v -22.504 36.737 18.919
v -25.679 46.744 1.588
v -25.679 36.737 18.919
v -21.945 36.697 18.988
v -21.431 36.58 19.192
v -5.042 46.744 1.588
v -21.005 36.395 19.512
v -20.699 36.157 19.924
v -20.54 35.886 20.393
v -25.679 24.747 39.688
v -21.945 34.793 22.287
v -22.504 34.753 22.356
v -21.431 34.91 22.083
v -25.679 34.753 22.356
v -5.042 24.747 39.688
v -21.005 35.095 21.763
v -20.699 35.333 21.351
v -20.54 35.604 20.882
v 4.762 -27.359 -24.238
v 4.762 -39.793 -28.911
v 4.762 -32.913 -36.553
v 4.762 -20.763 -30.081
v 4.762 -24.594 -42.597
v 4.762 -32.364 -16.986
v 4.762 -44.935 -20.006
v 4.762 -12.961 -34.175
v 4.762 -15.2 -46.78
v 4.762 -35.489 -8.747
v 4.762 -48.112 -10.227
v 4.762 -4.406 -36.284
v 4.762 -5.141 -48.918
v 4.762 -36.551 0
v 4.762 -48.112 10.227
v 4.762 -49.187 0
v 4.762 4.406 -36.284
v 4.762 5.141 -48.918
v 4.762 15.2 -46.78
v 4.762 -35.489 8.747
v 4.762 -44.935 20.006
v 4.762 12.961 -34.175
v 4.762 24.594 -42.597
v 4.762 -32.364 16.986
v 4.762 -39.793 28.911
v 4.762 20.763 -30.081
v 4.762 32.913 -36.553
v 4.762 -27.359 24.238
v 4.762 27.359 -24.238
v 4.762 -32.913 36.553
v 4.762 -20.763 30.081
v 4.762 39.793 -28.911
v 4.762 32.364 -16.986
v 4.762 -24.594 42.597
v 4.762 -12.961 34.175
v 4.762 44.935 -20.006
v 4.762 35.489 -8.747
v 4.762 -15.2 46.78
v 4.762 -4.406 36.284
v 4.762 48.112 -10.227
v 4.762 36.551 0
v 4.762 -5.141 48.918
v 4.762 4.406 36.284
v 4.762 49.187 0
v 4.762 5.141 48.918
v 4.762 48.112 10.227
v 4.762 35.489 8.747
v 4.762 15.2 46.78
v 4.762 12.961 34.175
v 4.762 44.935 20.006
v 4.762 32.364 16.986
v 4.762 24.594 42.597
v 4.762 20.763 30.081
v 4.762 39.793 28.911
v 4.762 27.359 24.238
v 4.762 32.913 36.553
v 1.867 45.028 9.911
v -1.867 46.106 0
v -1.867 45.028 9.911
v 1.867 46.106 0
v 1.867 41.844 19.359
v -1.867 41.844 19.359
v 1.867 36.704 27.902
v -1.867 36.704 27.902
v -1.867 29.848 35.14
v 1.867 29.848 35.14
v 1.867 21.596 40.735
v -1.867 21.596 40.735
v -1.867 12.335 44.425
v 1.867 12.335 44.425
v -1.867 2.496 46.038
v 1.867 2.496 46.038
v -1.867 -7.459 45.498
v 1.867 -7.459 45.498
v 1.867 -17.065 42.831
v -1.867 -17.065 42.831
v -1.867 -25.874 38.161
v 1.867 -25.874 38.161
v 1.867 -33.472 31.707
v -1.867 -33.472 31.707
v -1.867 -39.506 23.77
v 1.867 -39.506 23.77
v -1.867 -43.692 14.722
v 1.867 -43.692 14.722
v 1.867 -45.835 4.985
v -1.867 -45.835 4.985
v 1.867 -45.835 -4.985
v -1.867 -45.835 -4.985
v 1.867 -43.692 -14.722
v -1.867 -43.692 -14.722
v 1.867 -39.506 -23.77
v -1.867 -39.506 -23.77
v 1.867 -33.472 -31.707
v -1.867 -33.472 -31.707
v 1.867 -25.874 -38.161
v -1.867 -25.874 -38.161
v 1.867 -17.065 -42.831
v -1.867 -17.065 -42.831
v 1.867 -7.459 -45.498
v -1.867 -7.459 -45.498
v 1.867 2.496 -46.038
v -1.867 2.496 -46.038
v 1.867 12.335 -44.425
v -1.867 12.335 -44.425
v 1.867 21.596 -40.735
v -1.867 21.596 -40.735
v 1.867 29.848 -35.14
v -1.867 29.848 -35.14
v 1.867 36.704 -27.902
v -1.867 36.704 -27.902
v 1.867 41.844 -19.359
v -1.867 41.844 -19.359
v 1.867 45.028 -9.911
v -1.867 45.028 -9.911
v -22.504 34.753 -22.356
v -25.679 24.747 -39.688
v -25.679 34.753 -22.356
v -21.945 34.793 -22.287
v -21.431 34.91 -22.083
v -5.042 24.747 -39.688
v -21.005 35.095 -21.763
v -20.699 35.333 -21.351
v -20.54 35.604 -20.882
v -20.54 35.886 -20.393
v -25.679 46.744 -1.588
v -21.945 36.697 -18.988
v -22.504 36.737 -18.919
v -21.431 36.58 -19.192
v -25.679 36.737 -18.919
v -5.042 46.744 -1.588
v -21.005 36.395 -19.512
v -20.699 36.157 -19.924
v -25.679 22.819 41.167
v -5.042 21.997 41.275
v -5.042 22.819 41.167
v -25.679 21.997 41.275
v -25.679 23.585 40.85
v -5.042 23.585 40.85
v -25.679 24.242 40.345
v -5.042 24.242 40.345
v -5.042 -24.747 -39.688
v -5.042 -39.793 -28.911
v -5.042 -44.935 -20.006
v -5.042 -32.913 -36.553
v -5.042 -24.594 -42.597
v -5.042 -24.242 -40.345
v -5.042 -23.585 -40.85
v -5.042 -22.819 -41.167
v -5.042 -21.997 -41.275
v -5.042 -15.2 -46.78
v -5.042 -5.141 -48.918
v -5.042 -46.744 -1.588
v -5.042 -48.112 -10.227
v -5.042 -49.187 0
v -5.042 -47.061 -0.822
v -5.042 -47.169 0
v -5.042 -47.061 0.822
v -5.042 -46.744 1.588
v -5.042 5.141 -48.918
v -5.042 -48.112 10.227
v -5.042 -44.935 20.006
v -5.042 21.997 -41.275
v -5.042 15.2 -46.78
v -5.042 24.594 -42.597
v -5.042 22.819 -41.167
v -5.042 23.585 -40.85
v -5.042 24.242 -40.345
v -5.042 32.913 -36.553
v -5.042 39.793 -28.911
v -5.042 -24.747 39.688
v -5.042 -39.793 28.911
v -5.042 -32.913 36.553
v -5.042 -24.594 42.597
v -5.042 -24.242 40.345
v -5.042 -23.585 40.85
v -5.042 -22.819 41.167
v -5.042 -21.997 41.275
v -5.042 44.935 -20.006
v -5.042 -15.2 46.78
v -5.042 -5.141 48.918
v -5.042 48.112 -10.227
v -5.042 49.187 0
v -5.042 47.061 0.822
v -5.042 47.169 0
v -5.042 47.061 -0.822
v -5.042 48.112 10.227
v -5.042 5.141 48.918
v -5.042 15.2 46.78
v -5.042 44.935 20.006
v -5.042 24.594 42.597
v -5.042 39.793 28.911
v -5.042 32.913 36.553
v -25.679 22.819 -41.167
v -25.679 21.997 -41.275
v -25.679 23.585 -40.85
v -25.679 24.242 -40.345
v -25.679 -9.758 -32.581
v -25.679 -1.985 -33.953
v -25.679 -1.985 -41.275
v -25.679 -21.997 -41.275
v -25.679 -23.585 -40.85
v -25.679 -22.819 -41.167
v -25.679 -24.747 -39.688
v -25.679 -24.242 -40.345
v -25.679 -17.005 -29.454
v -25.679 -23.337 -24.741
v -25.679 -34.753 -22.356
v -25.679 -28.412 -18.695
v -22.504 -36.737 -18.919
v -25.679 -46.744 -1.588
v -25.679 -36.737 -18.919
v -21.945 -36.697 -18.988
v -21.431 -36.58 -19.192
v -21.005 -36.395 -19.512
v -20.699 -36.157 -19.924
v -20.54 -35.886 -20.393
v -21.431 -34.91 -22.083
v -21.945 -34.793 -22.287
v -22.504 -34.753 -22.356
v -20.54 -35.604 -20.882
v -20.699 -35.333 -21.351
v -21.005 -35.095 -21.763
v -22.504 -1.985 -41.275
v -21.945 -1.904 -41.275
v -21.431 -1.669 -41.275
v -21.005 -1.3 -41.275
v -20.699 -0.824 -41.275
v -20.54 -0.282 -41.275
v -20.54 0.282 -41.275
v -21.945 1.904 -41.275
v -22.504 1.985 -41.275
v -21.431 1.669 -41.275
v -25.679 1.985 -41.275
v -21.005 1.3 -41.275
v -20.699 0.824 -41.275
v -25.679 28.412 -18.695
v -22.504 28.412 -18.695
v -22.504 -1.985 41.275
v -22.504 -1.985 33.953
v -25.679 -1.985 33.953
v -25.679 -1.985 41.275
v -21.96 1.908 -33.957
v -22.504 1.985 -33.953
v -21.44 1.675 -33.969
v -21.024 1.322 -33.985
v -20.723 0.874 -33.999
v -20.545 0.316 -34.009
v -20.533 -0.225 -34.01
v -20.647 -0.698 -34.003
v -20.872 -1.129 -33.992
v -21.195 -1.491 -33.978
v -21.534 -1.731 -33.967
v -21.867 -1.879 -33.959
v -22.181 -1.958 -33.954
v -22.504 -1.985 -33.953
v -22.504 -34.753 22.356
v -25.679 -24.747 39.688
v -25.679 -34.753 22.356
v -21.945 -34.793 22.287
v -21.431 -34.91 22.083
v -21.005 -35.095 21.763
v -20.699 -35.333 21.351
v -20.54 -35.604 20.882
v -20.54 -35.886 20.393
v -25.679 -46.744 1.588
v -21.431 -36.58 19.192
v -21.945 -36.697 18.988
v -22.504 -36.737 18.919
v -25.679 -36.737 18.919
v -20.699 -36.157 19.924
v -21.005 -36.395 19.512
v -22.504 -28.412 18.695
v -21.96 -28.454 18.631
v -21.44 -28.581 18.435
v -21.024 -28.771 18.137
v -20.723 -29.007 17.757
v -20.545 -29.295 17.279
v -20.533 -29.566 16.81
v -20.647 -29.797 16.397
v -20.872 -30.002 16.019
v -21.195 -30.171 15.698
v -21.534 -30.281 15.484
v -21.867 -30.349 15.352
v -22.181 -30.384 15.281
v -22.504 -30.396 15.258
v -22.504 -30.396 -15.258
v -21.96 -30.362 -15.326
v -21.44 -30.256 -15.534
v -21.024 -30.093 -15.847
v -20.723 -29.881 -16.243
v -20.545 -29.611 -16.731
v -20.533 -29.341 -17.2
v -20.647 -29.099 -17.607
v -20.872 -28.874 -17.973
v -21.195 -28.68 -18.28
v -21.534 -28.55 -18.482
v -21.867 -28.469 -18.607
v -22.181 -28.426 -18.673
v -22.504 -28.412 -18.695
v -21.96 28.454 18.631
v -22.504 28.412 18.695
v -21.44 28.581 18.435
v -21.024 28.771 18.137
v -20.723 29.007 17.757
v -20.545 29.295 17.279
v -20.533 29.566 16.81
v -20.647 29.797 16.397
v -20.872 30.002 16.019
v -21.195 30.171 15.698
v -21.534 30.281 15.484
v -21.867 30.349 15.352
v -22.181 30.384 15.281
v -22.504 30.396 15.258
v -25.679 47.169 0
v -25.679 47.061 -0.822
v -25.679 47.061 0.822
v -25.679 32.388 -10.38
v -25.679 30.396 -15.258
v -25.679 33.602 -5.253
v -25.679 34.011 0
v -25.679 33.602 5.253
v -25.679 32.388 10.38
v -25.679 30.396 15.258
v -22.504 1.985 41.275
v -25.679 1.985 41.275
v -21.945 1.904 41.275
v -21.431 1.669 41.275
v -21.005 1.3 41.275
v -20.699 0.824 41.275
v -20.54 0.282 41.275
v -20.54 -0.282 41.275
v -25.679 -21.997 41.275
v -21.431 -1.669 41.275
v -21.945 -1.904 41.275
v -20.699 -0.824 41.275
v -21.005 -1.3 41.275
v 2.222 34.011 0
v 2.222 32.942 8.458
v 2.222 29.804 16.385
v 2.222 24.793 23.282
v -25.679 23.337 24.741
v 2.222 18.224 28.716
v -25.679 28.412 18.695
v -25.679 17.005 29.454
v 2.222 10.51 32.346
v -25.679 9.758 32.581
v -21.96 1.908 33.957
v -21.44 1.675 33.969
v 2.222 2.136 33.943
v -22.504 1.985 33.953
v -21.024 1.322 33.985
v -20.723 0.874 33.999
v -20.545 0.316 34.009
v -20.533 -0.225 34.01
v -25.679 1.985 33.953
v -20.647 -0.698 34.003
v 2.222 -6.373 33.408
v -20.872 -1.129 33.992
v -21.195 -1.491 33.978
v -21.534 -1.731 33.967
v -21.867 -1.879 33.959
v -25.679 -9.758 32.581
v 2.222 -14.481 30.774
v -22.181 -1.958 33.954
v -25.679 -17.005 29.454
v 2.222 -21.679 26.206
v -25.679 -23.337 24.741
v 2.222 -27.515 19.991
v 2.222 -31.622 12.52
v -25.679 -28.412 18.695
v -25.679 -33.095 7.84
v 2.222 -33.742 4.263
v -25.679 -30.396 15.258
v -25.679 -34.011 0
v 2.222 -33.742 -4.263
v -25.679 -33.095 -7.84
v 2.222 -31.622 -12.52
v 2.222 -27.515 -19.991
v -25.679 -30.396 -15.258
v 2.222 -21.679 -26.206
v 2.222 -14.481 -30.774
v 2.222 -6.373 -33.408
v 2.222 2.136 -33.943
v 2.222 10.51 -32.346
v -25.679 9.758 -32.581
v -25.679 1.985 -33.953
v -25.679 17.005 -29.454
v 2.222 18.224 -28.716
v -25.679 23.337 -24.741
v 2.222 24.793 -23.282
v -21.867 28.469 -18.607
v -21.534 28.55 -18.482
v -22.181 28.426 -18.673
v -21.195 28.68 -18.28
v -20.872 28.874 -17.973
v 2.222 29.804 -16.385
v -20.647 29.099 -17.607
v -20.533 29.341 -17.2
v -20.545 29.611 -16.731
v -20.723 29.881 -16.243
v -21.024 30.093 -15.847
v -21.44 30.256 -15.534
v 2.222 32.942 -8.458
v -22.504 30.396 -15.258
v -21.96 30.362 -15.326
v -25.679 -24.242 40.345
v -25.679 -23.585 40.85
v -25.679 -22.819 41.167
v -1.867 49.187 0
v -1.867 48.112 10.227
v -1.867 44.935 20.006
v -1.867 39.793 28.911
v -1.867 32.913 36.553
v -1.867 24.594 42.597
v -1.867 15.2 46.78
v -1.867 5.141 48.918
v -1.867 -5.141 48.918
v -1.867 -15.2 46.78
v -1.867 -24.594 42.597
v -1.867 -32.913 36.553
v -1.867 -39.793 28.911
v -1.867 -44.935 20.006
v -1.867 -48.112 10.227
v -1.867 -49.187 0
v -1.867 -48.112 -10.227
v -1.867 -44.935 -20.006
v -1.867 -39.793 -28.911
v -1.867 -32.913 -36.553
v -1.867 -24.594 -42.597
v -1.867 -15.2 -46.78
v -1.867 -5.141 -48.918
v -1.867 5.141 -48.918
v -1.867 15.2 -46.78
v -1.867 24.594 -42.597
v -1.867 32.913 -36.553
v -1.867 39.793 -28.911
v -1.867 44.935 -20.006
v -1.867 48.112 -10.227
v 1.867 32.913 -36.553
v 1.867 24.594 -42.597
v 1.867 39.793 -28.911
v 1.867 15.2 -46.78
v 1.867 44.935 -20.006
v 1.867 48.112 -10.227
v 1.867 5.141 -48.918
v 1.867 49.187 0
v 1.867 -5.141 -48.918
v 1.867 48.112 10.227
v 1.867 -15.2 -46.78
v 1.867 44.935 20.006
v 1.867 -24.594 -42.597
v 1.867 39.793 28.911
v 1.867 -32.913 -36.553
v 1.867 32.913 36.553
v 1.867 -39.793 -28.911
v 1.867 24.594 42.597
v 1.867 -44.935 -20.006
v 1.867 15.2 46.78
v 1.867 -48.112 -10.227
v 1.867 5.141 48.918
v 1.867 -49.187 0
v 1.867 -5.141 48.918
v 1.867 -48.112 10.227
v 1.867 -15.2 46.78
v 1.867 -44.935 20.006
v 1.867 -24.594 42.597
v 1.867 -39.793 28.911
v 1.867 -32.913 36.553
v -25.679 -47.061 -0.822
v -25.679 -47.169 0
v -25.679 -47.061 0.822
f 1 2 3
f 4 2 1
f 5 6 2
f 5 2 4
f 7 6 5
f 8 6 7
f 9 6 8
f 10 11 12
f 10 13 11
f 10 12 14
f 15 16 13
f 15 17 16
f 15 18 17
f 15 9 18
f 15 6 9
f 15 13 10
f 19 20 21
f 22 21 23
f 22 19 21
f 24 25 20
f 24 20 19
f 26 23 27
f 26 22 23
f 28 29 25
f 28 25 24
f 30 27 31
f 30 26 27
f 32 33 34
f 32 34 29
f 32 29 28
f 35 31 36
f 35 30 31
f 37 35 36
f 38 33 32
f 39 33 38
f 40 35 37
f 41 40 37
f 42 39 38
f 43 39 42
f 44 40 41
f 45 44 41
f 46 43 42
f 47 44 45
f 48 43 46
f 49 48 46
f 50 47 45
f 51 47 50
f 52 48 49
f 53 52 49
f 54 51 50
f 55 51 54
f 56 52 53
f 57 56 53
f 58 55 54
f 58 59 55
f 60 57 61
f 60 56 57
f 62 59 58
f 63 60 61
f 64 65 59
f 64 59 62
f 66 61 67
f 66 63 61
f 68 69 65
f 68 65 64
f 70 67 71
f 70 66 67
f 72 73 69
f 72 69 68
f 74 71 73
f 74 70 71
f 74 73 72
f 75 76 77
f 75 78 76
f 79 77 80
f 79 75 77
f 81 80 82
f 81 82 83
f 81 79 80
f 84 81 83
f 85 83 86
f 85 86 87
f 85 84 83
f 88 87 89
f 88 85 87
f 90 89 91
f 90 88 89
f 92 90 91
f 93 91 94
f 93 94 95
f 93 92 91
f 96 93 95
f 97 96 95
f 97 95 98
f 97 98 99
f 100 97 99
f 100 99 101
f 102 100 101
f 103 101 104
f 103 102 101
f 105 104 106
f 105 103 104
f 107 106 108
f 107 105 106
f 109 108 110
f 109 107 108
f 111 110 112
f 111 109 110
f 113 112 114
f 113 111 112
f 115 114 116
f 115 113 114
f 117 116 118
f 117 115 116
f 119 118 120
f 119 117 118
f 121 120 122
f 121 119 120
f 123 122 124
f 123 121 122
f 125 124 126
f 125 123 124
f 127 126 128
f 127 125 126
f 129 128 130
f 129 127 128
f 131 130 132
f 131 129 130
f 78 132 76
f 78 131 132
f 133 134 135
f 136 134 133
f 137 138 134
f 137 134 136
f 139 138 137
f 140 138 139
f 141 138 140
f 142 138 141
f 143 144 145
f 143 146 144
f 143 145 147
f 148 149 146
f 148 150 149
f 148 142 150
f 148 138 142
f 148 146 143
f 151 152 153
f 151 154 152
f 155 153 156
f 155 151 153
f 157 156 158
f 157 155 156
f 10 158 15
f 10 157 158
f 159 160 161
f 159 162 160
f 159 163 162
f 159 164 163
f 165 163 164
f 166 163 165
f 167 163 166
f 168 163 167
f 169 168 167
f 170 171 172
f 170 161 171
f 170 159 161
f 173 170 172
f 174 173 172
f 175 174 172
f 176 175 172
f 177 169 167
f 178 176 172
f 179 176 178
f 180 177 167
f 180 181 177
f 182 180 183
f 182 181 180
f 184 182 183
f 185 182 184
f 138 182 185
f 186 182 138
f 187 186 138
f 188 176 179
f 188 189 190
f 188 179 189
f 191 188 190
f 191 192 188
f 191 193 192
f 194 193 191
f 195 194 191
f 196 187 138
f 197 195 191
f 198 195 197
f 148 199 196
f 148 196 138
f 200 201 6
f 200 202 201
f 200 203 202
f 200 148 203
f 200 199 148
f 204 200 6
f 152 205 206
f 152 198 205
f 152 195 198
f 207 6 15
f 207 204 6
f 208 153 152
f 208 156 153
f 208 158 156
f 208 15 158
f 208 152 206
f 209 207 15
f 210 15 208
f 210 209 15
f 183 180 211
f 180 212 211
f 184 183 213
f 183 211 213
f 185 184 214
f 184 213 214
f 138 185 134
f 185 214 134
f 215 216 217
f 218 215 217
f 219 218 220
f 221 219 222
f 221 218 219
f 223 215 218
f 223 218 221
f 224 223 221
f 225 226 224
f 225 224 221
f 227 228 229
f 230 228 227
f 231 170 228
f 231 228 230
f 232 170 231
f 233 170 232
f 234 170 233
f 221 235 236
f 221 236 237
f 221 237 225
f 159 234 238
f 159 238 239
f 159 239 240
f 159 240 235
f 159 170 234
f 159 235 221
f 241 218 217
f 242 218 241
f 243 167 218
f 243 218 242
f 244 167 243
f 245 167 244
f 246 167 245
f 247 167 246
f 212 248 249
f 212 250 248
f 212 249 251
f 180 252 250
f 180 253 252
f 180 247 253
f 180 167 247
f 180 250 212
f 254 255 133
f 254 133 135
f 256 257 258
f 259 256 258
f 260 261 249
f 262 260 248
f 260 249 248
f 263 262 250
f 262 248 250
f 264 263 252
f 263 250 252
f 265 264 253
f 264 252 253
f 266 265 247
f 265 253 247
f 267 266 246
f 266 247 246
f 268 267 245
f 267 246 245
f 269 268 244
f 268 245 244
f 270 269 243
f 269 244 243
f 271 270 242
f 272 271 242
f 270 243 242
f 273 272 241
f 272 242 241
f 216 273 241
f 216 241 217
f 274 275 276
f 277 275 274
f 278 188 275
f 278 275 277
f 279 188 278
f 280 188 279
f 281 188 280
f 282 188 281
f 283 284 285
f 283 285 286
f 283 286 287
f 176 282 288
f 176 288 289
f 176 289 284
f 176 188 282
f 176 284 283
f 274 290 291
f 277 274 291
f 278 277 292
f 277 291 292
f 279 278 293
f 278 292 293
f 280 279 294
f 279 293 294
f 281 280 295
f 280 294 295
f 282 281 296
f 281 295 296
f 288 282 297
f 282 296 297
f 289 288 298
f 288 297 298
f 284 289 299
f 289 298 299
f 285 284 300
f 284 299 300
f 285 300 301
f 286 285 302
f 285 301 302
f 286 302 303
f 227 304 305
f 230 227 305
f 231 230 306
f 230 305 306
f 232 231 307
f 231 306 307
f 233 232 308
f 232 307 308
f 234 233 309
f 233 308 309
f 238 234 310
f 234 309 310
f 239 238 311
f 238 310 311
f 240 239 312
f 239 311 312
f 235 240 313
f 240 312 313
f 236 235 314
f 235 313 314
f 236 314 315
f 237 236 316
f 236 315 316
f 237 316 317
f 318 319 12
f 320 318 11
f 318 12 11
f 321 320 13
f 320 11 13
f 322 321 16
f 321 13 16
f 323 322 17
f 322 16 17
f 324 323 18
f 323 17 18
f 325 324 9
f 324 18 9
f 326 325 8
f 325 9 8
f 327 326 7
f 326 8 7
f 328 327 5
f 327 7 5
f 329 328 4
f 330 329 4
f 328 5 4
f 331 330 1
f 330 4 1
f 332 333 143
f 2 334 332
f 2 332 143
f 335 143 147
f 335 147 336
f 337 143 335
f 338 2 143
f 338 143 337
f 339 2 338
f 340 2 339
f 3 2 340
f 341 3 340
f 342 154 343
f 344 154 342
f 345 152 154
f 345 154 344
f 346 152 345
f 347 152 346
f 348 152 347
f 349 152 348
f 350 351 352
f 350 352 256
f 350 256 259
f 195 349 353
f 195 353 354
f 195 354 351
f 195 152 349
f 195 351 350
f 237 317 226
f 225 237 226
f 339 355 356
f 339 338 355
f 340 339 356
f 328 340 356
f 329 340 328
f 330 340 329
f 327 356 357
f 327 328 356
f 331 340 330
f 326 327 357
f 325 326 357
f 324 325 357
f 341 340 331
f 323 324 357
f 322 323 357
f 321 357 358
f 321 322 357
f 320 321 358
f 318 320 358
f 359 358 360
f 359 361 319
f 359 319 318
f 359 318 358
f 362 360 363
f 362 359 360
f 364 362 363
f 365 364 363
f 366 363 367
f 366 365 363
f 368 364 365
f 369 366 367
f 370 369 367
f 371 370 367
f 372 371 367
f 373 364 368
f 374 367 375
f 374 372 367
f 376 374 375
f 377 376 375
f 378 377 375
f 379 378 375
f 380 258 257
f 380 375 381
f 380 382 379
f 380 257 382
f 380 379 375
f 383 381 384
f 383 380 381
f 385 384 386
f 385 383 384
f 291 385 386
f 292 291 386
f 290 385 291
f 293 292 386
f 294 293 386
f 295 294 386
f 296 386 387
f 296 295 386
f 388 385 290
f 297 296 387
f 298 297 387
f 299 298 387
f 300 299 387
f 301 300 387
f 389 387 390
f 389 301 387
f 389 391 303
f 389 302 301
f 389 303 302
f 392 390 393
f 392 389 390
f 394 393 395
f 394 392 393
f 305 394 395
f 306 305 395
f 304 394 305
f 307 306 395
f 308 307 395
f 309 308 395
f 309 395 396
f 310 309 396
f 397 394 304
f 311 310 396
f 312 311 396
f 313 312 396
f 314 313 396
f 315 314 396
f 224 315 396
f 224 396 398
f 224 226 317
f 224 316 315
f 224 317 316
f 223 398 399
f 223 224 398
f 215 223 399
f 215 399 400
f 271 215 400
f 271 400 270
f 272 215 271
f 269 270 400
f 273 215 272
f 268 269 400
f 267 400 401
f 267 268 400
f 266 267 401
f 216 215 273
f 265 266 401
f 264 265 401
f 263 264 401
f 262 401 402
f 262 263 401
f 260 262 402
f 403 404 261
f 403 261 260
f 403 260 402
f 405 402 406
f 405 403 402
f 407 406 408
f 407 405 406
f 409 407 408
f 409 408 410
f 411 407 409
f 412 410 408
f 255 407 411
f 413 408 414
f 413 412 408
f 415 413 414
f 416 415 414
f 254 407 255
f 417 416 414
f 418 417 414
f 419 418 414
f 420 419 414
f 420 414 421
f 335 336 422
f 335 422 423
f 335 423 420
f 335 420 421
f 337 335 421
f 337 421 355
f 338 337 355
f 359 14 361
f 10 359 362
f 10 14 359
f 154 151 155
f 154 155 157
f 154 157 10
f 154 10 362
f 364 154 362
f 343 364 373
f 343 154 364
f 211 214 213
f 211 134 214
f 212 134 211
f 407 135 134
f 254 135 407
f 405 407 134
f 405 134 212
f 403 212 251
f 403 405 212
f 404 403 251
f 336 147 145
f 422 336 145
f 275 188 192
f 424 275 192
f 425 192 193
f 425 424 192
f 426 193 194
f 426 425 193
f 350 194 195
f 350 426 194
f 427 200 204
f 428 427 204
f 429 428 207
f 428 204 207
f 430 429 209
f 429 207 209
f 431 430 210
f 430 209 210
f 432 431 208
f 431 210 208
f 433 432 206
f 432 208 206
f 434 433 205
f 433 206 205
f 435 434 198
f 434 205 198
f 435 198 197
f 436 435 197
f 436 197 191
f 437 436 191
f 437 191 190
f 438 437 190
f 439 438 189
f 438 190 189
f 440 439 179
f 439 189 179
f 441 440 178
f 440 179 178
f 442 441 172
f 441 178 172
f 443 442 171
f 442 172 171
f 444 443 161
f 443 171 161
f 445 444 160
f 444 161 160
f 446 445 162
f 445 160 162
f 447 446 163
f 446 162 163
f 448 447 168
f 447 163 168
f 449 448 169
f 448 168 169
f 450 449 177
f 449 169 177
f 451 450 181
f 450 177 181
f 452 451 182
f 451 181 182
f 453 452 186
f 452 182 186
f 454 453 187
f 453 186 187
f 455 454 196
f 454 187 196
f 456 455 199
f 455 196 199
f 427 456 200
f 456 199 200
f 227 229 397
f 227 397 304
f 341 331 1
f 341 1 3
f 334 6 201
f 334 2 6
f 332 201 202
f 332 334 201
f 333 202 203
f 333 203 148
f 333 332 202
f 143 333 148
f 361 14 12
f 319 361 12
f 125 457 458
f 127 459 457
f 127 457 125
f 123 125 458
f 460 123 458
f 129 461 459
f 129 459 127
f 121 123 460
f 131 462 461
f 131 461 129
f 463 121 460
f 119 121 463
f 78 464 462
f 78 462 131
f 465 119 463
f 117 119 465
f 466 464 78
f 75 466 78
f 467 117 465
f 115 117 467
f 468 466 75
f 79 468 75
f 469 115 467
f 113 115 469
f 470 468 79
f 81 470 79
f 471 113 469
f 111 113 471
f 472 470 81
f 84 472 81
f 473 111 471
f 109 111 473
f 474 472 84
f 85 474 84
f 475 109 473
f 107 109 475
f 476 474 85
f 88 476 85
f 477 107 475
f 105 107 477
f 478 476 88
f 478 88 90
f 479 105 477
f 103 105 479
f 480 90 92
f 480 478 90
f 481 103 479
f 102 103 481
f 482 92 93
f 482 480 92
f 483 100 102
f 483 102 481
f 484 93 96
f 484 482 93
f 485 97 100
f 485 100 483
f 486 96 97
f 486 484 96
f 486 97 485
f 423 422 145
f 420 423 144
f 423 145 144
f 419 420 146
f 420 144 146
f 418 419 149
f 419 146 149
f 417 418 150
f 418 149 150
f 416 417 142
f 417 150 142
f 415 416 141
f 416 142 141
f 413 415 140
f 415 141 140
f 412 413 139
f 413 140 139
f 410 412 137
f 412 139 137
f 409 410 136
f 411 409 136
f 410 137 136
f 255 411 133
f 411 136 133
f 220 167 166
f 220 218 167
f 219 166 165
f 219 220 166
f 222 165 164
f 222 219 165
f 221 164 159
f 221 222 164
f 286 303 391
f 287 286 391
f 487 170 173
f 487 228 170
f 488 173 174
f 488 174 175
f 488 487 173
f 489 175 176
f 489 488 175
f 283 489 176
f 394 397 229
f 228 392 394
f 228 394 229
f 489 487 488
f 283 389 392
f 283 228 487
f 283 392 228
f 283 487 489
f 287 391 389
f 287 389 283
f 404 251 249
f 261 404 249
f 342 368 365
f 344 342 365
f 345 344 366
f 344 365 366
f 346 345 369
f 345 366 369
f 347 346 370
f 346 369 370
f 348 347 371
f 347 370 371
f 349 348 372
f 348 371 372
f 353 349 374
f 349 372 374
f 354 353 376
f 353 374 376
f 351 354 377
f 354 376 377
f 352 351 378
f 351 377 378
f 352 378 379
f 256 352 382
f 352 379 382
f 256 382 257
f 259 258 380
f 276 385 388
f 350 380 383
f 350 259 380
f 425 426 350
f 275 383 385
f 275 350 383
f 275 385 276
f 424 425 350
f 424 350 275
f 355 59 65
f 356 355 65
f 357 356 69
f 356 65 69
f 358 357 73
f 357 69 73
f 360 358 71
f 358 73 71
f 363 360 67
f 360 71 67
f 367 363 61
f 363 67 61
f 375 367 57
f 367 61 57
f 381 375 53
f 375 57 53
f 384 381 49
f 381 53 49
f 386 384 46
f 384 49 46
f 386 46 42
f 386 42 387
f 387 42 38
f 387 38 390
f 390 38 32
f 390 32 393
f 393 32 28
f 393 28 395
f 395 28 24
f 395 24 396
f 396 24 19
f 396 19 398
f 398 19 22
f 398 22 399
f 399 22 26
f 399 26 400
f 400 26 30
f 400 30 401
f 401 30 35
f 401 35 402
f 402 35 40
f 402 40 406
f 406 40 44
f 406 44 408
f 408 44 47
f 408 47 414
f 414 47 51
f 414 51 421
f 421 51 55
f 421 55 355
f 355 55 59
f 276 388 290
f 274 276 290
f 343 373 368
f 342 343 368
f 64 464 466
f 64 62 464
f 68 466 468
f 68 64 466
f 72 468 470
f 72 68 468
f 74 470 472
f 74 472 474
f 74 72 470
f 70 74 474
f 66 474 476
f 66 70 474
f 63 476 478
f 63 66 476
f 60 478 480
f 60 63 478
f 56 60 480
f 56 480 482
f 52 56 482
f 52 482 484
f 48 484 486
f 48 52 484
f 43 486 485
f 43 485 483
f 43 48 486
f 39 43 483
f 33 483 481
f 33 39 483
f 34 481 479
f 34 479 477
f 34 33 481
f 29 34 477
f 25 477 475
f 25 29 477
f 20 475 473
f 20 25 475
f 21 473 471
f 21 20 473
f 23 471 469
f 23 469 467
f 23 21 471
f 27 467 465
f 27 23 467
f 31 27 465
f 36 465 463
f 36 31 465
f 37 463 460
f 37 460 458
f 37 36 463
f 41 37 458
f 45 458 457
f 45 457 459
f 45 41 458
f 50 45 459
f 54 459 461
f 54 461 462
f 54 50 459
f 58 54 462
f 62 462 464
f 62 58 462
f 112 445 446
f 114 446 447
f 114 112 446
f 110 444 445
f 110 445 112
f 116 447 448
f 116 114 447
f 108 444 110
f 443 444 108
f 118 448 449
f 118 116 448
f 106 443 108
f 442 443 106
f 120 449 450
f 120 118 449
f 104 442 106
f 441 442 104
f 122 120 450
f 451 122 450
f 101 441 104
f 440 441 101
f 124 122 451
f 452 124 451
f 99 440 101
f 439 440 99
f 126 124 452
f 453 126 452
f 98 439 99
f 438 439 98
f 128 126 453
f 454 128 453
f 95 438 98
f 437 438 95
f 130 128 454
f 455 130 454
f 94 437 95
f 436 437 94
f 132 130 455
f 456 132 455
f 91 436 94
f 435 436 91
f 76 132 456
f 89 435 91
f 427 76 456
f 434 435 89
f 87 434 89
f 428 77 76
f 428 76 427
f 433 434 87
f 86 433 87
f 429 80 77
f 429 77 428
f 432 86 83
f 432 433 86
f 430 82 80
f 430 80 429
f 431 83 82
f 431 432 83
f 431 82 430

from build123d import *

# Parameters (mm, degrees)
CUT_EXTRUDE1_START = -20.6375
SKETCH3_R          = 49.1871
CUT_EXTRUDE1_DEPTH = 20.6375
FILLET3_R          = 3.175
CHAMFER1_SIZE      = 2.54
CUT_EXTRUDE2_DEPTH = 91.4621
CIRPATTERN1_COUNT  = 6


with BuildPart() as part:
    # Sketch2 → Revolve1 (revolve)
    with BuildSketch(Plane.XY):
        Polygon((-25.6794, 49.1871), (-6.6294, 49.1871), (-1.8669, 49.1871), (-1.8669, 46.105572), (1.8669, 46.105572), (1.8669, 49.1871), (4.7625, 49.1871), (4.7625, 34.0106), (-25.6794, 34.0106), align=None)
    revolve(axis=Axis((0, 0, 0), (1, 0, 0)))

    # Sketch3 → Cut-Extrude1 (cut)
    with BuildSketch(Plane.ZY.offset(25.6794).offset(CUT_EXTRUDE1_START)):
        Circle(SKETCH3_R)
        Polygon((0, 47.660264722), (41.275, 23.830132361), (41.275, -23.830132361), (0, -47.660264722), (-41.275, -23.830132361), (-41.275, 23.830132361), align=None, mode=Mode.SUBTRACT)
    extrude(amount=CUT_EXTRUDE1_DEPTH, mode=Mode.SUBTRACT)

    # Fillet3
    fillet3_edges = [part.edges().sort_by_distance(p)[0] for p in [
        (-15.36065, -23.830132361, 41.275),
        (-15.36065, 23.830132361, 41.275),
        (-15.36065, 47.660264722, 0),
        (-15.36065, 23.830132361, -41.275),
        (-15.36065, -23.830132361, -41.275),
        (-15.36065, -47.660264722, 0),
    ]]
    fillet(fillet3_edges, radius=FILLET3_R)

    # Chamfer1
    chamfer1_edges = [part.edges().sort_by_distance(p)[0] for p in [
        (4.7625, -34.0106, 0),
    ]]
    chamfer(chamfer1_edges, length=CHAMFER1_SIZE)

    # Sketch4 → Cut-Extrude2 (cut, through all)
    with BuildSketch(Plane(origin=(0, 0, -41.275), x_dir=(-1, 0, 0), z_dir=(0, 0, -1))):
        with BuildLine():
            Line((25.6794, -1.984502), (25.6794, 1.984502))
            Line((25.6794, 1.984502), (22.5044, 1.984502))
            ThreePointArc((22.5044, 1.984502), (20.519898, 0), (22.5044, -1.984502))
            Line((22.5044, -1.984502), (25.6794, -1.984502))
        make_face()
    cut_extrude2 = extrude(amount=-CUT_EXTRUDE2_DEPTH, mode=Mode.SUBTRACT)

    # CirPattern1: Cut-Extrude2 ×6 about axis
    cirpattern1_axis = Axis((0, 0, 0), (1, 0, 0))
    for i in range(1, CIRPATTERN1_COUNT):
        add(cut_extrude2.rotate(cirpattern1_axis, i * 360 / CIRPATTERN1_COUNT), mode=Mode.SUBTRACT)


solid = part.part
